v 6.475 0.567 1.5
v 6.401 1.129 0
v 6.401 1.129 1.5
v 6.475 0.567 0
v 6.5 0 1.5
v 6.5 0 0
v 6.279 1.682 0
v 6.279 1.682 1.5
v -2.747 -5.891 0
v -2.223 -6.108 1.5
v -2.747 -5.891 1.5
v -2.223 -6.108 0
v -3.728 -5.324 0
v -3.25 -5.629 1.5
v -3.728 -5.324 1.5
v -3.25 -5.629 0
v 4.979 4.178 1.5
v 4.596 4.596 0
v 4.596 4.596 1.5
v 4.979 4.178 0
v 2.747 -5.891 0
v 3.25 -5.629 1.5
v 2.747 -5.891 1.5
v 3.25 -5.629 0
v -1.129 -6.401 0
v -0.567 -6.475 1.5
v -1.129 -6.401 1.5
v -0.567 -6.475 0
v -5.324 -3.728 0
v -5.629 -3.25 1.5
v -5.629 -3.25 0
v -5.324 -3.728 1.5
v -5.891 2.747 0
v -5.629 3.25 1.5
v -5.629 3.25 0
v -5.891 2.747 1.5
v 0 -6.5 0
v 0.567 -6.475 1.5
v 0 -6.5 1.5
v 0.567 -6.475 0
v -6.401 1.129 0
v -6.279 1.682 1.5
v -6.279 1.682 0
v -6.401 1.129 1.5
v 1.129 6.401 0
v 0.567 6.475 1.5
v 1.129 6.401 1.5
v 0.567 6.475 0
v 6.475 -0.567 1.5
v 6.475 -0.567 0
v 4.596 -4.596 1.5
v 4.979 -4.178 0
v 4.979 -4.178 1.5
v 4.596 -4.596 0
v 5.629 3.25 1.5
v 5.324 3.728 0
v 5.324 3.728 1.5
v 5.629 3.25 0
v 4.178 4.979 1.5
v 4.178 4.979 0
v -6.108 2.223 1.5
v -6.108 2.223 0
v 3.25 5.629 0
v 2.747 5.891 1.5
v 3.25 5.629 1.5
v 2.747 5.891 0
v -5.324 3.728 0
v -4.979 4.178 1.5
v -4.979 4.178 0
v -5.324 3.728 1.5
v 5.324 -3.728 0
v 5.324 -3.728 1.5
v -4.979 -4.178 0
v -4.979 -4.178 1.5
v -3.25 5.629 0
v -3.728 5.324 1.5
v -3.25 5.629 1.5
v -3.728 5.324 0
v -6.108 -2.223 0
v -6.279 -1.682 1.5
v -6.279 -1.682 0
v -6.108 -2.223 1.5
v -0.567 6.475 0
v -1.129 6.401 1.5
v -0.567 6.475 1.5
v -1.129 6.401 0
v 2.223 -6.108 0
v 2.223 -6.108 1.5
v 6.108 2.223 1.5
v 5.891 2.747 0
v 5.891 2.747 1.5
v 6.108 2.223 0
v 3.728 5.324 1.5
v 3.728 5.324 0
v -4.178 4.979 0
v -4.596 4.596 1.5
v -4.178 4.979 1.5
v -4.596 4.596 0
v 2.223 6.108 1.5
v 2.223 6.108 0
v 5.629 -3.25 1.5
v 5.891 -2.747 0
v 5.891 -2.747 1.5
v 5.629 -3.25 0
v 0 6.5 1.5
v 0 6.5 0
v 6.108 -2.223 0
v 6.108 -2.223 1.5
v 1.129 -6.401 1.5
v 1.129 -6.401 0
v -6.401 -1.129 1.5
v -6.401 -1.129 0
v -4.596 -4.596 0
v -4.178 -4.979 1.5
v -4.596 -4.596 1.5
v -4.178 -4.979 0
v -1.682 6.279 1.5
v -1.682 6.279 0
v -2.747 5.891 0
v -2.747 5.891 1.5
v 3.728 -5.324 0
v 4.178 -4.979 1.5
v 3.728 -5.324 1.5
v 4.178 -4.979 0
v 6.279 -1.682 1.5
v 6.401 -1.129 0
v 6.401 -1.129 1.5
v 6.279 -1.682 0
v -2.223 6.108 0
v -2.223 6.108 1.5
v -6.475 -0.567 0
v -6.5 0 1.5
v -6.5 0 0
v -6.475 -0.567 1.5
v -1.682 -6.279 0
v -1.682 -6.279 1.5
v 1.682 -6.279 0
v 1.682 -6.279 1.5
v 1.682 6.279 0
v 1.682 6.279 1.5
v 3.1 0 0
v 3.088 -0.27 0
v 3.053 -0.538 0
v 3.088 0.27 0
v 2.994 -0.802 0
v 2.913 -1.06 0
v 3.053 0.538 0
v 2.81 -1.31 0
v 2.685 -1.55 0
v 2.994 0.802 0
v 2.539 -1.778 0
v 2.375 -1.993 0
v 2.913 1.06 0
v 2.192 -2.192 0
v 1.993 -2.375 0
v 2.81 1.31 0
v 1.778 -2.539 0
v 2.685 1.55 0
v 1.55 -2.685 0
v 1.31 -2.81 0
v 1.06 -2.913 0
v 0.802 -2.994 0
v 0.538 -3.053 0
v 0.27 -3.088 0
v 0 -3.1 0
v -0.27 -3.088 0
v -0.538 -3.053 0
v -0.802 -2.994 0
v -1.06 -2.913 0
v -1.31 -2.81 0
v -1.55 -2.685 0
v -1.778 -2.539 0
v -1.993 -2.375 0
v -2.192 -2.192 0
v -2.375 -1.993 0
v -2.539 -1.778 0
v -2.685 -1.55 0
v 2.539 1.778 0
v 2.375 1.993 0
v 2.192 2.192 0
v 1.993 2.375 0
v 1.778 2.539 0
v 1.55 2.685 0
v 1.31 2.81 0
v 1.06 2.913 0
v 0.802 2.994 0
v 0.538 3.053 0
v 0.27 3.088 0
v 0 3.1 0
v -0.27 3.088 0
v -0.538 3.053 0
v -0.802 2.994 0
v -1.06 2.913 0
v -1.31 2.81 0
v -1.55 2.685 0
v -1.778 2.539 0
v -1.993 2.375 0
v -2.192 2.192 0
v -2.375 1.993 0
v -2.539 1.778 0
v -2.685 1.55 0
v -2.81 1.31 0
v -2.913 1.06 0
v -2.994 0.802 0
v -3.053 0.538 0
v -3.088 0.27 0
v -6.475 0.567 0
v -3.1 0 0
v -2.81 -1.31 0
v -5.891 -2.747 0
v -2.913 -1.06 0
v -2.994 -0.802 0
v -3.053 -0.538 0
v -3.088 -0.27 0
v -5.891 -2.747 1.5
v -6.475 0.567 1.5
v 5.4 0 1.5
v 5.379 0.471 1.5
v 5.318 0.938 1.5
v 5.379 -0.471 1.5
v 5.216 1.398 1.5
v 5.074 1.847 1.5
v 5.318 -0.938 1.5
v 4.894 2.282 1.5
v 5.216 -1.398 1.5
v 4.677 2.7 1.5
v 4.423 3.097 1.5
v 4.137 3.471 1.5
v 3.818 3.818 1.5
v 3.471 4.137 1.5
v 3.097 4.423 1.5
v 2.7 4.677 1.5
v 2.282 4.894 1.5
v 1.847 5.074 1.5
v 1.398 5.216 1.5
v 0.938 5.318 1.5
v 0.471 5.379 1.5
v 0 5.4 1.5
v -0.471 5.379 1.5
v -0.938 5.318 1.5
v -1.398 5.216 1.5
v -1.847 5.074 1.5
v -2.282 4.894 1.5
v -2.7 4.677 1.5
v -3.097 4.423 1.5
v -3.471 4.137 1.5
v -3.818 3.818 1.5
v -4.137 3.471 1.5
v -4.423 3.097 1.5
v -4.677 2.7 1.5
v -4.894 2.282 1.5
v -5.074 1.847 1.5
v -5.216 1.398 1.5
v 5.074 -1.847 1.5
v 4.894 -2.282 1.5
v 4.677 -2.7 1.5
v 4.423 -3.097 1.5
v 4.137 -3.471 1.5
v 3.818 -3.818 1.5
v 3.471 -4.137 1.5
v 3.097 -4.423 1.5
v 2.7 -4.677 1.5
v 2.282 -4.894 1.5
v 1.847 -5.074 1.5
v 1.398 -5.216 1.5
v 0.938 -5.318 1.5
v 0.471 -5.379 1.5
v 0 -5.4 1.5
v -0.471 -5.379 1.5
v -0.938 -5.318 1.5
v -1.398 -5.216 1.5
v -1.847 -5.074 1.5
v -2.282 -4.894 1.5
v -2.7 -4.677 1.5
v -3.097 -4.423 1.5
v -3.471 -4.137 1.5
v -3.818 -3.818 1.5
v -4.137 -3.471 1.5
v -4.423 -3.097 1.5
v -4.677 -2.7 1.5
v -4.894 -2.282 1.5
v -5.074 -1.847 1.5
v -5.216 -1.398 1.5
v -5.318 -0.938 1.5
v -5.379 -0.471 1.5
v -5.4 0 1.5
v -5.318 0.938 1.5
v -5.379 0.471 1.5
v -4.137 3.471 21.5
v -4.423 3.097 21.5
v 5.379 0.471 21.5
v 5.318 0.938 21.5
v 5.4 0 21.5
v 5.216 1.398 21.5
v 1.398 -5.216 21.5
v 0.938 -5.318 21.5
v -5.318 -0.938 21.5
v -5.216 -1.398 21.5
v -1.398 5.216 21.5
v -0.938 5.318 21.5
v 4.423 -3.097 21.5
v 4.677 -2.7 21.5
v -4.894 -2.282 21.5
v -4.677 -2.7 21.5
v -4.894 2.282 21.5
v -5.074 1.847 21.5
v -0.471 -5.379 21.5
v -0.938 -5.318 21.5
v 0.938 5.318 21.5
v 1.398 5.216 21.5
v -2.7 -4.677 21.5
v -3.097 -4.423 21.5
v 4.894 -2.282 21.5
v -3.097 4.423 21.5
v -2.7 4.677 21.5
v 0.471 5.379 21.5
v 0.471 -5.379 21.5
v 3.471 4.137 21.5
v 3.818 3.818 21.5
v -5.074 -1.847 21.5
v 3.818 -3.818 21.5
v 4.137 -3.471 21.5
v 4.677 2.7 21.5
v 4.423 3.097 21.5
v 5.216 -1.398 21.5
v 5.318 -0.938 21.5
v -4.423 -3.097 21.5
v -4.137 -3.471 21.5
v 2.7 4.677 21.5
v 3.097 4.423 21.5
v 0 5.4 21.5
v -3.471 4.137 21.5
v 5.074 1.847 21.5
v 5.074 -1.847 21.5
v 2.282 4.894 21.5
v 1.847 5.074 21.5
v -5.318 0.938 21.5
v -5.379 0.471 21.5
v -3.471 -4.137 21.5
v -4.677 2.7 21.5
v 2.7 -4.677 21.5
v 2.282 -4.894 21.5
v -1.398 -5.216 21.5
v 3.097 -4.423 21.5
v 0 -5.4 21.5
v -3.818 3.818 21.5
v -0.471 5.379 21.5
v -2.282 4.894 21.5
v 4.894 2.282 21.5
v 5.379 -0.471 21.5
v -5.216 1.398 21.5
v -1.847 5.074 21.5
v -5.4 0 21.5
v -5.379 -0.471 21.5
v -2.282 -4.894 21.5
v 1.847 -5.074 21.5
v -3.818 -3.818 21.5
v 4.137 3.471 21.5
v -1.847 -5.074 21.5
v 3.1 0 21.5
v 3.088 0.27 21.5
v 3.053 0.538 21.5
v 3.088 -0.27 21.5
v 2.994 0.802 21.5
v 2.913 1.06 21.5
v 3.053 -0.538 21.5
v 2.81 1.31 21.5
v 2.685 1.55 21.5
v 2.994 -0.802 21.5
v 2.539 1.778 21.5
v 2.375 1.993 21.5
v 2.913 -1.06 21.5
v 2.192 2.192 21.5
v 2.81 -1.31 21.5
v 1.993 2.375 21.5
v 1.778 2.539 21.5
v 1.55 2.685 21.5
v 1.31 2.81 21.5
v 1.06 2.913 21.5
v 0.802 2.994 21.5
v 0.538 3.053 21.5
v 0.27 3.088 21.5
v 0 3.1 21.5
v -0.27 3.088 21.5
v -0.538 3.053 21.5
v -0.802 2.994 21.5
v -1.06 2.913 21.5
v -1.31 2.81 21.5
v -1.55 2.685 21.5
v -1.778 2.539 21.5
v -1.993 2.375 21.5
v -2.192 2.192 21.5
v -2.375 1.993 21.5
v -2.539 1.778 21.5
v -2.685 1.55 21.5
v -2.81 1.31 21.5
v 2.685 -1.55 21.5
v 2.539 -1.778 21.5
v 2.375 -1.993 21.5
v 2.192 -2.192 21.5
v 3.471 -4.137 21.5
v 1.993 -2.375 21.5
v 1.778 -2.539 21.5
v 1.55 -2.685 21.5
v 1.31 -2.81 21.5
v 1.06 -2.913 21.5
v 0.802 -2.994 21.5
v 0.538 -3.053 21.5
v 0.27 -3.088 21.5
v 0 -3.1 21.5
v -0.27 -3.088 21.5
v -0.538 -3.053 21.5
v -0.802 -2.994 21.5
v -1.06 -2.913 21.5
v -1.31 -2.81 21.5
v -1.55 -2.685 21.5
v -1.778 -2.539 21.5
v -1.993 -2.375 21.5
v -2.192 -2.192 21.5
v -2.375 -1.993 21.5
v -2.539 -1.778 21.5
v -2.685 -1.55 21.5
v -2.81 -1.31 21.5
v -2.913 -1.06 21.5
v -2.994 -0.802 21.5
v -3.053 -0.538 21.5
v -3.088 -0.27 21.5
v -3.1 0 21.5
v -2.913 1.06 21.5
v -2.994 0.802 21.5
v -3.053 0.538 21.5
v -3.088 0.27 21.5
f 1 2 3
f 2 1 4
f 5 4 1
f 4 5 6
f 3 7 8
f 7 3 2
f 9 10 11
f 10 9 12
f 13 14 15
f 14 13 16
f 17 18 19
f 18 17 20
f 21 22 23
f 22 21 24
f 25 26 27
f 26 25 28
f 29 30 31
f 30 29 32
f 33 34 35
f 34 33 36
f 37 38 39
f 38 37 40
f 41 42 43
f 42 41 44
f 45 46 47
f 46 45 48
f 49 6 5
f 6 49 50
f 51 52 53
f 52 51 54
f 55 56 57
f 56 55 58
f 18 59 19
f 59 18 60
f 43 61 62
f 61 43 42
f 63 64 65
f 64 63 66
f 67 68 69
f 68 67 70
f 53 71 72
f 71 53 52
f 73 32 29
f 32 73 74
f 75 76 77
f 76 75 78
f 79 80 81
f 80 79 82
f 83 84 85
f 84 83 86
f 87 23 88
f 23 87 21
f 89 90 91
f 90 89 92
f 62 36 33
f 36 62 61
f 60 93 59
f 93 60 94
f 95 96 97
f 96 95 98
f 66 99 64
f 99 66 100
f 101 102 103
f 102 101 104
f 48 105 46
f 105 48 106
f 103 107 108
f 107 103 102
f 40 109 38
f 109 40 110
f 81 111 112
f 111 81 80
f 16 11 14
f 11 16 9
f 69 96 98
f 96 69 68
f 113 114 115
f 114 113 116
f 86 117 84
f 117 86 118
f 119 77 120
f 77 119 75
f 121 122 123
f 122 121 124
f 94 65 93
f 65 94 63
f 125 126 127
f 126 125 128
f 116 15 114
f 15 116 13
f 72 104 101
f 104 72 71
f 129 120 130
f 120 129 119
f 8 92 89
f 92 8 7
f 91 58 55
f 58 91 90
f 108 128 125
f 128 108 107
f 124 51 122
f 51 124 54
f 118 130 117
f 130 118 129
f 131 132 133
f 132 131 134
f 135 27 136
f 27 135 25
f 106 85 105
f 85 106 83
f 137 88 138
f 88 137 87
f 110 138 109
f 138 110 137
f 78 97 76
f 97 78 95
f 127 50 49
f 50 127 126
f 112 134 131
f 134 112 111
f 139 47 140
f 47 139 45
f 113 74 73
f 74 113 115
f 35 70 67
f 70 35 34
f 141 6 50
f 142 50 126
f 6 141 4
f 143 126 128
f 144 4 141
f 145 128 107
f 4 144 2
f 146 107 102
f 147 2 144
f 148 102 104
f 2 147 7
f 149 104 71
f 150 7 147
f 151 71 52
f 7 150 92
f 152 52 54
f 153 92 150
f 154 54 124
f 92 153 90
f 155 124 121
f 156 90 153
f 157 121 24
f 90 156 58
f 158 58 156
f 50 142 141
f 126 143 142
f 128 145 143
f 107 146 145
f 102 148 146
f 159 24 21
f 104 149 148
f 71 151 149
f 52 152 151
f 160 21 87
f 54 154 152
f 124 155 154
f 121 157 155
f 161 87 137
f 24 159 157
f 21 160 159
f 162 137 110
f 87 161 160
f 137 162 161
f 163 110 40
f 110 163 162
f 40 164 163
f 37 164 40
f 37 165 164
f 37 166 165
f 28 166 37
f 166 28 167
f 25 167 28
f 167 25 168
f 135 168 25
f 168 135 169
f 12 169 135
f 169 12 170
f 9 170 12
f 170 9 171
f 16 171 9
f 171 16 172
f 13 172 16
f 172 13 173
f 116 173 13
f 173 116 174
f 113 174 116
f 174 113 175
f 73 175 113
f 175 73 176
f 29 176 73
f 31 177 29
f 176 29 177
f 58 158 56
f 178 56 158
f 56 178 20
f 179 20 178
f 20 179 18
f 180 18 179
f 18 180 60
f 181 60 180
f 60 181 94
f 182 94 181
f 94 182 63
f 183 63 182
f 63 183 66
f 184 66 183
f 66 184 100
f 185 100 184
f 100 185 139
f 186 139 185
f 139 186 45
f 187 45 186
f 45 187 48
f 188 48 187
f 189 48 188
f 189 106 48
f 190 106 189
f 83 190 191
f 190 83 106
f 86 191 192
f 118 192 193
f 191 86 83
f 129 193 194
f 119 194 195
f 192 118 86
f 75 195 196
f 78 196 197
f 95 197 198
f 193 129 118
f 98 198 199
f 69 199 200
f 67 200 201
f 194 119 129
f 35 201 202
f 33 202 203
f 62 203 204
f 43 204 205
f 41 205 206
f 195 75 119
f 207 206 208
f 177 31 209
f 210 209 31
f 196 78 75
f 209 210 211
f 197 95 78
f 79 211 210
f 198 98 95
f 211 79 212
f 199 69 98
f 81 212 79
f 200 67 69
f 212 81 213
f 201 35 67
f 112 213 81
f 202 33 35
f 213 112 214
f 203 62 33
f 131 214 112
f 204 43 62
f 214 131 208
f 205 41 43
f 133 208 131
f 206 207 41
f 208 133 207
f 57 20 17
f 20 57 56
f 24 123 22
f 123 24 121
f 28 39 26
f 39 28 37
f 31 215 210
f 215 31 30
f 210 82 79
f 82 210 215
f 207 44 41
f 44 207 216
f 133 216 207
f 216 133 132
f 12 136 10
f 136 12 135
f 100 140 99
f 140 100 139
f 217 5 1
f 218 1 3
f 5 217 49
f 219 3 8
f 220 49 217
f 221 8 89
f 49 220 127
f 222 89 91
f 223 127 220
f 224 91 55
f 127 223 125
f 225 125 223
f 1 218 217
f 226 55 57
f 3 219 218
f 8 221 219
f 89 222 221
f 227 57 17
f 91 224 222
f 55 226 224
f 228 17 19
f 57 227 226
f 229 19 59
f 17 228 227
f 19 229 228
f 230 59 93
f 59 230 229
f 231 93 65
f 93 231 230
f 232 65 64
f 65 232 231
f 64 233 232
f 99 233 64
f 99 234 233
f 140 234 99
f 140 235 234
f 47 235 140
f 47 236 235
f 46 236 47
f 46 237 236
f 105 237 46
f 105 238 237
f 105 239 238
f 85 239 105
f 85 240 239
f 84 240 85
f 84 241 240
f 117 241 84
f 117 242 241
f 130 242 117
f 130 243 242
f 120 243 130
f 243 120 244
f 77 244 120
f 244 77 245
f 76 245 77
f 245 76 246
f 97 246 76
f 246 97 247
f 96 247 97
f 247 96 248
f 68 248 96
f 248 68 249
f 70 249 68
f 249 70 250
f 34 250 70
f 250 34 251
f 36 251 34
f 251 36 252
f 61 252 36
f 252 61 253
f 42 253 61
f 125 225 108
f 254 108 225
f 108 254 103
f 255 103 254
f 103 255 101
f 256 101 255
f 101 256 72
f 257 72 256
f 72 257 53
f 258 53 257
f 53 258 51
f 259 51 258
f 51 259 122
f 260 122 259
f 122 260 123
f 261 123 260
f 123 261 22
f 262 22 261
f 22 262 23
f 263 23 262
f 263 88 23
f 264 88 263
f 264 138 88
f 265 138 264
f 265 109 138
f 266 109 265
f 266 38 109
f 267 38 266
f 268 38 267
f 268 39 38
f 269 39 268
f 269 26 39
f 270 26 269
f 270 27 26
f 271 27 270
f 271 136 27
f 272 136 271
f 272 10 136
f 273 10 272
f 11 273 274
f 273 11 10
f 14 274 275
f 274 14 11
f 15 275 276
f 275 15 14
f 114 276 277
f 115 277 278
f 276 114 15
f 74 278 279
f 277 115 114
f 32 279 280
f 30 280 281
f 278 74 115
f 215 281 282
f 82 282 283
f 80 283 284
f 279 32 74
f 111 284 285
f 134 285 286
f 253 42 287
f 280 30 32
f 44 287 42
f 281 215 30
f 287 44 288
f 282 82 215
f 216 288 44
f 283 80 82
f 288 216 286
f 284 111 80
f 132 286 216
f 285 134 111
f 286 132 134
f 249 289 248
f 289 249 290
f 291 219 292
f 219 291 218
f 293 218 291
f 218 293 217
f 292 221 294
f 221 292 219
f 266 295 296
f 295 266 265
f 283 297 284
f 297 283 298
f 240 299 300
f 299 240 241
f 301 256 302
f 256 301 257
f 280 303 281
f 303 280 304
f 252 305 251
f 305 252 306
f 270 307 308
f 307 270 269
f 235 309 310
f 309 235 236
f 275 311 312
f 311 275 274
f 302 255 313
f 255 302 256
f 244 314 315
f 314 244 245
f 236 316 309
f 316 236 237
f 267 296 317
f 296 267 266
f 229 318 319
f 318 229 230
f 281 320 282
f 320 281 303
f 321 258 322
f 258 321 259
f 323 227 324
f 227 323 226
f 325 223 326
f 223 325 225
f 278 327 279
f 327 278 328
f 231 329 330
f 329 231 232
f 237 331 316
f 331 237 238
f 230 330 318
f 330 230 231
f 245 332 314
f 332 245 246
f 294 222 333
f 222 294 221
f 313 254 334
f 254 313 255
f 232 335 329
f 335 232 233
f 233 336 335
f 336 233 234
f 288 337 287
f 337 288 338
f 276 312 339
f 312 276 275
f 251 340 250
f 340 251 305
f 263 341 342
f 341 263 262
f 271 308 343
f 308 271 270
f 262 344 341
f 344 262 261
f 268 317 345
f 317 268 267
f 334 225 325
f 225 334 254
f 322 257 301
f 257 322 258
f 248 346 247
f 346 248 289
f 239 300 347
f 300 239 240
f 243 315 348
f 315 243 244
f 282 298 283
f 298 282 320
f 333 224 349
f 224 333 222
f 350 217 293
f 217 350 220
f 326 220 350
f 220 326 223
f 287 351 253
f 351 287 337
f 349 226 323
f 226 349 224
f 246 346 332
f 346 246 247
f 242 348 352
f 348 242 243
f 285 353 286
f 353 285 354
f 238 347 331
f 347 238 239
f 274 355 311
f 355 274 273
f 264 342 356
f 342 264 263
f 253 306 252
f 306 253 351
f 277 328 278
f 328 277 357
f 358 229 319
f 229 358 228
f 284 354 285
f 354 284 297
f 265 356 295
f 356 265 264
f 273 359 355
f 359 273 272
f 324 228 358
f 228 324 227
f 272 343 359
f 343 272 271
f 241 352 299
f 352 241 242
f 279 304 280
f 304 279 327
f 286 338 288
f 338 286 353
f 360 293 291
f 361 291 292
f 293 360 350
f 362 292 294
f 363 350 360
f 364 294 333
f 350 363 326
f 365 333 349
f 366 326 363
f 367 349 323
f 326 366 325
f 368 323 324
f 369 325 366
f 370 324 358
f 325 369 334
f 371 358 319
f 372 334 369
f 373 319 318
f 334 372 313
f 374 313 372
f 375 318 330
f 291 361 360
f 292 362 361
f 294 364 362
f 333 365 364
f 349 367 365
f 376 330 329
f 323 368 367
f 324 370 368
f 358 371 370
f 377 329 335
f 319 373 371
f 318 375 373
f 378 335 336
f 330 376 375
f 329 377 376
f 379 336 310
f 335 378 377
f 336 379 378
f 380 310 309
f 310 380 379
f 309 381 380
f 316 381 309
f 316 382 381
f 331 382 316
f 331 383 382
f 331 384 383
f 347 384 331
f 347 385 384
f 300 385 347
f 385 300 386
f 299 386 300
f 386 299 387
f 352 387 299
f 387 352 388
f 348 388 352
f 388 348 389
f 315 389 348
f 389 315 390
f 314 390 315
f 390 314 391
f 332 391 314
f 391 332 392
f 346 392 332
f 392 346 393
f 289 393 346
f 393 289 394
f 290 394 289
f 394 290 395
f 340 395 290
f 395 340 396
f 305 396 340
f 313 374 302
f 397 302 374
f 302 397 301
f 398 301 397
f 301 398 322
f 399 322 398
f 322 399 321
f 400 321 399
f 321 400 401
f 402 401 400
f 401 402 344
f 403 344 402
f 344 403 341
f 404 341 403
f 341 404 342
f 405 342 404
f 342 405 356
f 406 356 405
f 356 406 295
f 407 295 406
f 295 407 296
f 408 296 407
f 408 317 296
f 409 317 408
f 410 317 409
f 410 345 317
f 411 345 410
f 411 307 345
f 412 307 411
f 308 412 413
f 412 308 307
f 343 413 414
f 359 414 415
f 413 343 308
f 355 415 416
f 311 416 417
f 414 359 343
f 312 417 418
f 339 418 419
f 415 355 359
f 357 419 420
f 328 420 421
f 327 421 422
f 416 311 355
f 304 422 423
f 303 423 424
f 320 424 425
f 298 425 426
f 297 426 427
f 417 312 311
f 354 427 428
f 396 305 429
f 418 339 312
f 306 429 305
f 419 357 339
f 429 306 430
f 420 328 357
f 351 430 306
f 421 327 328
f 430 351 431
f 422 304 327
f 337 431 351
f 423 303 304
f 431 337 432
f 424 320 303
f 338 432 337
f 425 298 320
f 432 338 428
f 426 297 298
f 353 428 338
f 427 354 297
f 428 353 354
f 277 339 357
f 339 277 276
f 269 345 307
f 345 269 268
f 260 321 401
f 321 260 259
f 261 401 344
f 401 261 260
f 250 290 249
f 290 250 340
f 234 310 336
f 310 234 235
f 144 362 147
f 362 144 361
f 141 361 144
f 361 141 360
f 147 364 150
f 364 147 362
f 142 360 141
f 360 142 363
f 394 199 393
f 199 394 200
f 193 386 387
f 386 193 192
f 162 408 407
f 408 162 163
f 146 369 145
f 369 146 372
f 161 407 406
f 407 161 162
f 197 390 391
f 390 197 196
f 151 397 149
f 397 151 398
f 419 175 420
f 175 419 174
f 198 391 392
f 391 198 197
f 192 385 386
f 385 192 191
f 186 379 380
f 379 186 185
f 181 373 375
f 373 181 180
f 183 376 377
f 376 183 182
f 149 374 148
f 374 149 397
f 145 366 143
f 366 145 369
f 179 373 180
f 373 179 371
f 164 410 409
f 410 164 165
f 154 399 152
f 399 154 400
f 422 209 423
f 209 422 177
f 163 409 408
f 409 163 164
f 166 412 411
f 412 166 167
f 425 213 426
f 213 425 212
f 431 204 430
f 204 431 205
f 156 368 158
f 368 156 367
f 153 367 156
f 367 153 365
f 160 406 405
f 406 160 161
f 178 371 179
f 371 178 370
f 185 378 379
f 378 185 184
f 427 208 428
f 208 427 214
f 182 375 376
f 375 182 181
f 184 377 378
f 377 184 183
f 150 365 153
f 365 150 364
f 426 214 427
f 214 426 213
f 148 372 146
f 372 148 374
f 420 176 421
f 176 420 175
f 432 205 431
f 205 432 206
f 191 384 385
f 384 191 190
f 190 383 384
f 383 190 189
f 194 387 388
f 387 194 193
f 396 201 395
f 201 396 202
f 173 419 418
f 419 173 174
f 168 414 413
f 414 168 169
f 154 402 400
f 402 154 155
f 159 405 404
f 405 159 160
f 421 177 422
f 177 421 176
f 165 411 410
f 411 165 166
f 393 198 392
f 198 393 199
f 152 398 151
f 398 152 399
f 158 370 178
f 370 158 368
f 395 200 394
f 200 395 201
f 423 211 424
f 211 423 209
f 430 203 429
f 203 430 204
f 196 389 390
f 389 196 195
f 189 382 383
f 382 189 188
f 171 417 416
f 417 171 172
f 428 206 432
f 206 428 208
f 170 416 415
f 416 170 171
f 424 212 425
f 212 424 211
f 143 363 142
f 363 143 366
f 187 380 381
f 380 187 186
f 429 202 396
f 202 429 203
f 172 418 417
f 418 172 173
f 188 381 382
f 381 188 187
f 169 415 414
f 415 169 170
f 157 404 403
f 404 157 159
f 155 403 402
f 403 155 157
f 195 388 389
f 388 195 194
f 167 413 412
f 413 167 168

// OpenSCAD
// Adapter sleeve - a collar with a tube sleeve below, boring through, to adapt a smaller tube
// to a larger tube rack hole. NOVEL general part.
//

collar_d   = 13;
collar_h   = 1.5;
sleeve_d   = 10.8;
sleeve_h   = 21.5;
bore_d     = 6.2;

$fn = 72;

collar_t = 2;

difference() {
    union() {
        cylinder(h = collar_h, d = collar_d);                 // collar (contact the rack)
        cylinder(h = sleeve_h, d = sleeve_d);                 // sleeve below
    }
    translate([0, 0, -1]) cylinder(h = sleeve_h + 2, d = bore_d);   // through-bore
}
